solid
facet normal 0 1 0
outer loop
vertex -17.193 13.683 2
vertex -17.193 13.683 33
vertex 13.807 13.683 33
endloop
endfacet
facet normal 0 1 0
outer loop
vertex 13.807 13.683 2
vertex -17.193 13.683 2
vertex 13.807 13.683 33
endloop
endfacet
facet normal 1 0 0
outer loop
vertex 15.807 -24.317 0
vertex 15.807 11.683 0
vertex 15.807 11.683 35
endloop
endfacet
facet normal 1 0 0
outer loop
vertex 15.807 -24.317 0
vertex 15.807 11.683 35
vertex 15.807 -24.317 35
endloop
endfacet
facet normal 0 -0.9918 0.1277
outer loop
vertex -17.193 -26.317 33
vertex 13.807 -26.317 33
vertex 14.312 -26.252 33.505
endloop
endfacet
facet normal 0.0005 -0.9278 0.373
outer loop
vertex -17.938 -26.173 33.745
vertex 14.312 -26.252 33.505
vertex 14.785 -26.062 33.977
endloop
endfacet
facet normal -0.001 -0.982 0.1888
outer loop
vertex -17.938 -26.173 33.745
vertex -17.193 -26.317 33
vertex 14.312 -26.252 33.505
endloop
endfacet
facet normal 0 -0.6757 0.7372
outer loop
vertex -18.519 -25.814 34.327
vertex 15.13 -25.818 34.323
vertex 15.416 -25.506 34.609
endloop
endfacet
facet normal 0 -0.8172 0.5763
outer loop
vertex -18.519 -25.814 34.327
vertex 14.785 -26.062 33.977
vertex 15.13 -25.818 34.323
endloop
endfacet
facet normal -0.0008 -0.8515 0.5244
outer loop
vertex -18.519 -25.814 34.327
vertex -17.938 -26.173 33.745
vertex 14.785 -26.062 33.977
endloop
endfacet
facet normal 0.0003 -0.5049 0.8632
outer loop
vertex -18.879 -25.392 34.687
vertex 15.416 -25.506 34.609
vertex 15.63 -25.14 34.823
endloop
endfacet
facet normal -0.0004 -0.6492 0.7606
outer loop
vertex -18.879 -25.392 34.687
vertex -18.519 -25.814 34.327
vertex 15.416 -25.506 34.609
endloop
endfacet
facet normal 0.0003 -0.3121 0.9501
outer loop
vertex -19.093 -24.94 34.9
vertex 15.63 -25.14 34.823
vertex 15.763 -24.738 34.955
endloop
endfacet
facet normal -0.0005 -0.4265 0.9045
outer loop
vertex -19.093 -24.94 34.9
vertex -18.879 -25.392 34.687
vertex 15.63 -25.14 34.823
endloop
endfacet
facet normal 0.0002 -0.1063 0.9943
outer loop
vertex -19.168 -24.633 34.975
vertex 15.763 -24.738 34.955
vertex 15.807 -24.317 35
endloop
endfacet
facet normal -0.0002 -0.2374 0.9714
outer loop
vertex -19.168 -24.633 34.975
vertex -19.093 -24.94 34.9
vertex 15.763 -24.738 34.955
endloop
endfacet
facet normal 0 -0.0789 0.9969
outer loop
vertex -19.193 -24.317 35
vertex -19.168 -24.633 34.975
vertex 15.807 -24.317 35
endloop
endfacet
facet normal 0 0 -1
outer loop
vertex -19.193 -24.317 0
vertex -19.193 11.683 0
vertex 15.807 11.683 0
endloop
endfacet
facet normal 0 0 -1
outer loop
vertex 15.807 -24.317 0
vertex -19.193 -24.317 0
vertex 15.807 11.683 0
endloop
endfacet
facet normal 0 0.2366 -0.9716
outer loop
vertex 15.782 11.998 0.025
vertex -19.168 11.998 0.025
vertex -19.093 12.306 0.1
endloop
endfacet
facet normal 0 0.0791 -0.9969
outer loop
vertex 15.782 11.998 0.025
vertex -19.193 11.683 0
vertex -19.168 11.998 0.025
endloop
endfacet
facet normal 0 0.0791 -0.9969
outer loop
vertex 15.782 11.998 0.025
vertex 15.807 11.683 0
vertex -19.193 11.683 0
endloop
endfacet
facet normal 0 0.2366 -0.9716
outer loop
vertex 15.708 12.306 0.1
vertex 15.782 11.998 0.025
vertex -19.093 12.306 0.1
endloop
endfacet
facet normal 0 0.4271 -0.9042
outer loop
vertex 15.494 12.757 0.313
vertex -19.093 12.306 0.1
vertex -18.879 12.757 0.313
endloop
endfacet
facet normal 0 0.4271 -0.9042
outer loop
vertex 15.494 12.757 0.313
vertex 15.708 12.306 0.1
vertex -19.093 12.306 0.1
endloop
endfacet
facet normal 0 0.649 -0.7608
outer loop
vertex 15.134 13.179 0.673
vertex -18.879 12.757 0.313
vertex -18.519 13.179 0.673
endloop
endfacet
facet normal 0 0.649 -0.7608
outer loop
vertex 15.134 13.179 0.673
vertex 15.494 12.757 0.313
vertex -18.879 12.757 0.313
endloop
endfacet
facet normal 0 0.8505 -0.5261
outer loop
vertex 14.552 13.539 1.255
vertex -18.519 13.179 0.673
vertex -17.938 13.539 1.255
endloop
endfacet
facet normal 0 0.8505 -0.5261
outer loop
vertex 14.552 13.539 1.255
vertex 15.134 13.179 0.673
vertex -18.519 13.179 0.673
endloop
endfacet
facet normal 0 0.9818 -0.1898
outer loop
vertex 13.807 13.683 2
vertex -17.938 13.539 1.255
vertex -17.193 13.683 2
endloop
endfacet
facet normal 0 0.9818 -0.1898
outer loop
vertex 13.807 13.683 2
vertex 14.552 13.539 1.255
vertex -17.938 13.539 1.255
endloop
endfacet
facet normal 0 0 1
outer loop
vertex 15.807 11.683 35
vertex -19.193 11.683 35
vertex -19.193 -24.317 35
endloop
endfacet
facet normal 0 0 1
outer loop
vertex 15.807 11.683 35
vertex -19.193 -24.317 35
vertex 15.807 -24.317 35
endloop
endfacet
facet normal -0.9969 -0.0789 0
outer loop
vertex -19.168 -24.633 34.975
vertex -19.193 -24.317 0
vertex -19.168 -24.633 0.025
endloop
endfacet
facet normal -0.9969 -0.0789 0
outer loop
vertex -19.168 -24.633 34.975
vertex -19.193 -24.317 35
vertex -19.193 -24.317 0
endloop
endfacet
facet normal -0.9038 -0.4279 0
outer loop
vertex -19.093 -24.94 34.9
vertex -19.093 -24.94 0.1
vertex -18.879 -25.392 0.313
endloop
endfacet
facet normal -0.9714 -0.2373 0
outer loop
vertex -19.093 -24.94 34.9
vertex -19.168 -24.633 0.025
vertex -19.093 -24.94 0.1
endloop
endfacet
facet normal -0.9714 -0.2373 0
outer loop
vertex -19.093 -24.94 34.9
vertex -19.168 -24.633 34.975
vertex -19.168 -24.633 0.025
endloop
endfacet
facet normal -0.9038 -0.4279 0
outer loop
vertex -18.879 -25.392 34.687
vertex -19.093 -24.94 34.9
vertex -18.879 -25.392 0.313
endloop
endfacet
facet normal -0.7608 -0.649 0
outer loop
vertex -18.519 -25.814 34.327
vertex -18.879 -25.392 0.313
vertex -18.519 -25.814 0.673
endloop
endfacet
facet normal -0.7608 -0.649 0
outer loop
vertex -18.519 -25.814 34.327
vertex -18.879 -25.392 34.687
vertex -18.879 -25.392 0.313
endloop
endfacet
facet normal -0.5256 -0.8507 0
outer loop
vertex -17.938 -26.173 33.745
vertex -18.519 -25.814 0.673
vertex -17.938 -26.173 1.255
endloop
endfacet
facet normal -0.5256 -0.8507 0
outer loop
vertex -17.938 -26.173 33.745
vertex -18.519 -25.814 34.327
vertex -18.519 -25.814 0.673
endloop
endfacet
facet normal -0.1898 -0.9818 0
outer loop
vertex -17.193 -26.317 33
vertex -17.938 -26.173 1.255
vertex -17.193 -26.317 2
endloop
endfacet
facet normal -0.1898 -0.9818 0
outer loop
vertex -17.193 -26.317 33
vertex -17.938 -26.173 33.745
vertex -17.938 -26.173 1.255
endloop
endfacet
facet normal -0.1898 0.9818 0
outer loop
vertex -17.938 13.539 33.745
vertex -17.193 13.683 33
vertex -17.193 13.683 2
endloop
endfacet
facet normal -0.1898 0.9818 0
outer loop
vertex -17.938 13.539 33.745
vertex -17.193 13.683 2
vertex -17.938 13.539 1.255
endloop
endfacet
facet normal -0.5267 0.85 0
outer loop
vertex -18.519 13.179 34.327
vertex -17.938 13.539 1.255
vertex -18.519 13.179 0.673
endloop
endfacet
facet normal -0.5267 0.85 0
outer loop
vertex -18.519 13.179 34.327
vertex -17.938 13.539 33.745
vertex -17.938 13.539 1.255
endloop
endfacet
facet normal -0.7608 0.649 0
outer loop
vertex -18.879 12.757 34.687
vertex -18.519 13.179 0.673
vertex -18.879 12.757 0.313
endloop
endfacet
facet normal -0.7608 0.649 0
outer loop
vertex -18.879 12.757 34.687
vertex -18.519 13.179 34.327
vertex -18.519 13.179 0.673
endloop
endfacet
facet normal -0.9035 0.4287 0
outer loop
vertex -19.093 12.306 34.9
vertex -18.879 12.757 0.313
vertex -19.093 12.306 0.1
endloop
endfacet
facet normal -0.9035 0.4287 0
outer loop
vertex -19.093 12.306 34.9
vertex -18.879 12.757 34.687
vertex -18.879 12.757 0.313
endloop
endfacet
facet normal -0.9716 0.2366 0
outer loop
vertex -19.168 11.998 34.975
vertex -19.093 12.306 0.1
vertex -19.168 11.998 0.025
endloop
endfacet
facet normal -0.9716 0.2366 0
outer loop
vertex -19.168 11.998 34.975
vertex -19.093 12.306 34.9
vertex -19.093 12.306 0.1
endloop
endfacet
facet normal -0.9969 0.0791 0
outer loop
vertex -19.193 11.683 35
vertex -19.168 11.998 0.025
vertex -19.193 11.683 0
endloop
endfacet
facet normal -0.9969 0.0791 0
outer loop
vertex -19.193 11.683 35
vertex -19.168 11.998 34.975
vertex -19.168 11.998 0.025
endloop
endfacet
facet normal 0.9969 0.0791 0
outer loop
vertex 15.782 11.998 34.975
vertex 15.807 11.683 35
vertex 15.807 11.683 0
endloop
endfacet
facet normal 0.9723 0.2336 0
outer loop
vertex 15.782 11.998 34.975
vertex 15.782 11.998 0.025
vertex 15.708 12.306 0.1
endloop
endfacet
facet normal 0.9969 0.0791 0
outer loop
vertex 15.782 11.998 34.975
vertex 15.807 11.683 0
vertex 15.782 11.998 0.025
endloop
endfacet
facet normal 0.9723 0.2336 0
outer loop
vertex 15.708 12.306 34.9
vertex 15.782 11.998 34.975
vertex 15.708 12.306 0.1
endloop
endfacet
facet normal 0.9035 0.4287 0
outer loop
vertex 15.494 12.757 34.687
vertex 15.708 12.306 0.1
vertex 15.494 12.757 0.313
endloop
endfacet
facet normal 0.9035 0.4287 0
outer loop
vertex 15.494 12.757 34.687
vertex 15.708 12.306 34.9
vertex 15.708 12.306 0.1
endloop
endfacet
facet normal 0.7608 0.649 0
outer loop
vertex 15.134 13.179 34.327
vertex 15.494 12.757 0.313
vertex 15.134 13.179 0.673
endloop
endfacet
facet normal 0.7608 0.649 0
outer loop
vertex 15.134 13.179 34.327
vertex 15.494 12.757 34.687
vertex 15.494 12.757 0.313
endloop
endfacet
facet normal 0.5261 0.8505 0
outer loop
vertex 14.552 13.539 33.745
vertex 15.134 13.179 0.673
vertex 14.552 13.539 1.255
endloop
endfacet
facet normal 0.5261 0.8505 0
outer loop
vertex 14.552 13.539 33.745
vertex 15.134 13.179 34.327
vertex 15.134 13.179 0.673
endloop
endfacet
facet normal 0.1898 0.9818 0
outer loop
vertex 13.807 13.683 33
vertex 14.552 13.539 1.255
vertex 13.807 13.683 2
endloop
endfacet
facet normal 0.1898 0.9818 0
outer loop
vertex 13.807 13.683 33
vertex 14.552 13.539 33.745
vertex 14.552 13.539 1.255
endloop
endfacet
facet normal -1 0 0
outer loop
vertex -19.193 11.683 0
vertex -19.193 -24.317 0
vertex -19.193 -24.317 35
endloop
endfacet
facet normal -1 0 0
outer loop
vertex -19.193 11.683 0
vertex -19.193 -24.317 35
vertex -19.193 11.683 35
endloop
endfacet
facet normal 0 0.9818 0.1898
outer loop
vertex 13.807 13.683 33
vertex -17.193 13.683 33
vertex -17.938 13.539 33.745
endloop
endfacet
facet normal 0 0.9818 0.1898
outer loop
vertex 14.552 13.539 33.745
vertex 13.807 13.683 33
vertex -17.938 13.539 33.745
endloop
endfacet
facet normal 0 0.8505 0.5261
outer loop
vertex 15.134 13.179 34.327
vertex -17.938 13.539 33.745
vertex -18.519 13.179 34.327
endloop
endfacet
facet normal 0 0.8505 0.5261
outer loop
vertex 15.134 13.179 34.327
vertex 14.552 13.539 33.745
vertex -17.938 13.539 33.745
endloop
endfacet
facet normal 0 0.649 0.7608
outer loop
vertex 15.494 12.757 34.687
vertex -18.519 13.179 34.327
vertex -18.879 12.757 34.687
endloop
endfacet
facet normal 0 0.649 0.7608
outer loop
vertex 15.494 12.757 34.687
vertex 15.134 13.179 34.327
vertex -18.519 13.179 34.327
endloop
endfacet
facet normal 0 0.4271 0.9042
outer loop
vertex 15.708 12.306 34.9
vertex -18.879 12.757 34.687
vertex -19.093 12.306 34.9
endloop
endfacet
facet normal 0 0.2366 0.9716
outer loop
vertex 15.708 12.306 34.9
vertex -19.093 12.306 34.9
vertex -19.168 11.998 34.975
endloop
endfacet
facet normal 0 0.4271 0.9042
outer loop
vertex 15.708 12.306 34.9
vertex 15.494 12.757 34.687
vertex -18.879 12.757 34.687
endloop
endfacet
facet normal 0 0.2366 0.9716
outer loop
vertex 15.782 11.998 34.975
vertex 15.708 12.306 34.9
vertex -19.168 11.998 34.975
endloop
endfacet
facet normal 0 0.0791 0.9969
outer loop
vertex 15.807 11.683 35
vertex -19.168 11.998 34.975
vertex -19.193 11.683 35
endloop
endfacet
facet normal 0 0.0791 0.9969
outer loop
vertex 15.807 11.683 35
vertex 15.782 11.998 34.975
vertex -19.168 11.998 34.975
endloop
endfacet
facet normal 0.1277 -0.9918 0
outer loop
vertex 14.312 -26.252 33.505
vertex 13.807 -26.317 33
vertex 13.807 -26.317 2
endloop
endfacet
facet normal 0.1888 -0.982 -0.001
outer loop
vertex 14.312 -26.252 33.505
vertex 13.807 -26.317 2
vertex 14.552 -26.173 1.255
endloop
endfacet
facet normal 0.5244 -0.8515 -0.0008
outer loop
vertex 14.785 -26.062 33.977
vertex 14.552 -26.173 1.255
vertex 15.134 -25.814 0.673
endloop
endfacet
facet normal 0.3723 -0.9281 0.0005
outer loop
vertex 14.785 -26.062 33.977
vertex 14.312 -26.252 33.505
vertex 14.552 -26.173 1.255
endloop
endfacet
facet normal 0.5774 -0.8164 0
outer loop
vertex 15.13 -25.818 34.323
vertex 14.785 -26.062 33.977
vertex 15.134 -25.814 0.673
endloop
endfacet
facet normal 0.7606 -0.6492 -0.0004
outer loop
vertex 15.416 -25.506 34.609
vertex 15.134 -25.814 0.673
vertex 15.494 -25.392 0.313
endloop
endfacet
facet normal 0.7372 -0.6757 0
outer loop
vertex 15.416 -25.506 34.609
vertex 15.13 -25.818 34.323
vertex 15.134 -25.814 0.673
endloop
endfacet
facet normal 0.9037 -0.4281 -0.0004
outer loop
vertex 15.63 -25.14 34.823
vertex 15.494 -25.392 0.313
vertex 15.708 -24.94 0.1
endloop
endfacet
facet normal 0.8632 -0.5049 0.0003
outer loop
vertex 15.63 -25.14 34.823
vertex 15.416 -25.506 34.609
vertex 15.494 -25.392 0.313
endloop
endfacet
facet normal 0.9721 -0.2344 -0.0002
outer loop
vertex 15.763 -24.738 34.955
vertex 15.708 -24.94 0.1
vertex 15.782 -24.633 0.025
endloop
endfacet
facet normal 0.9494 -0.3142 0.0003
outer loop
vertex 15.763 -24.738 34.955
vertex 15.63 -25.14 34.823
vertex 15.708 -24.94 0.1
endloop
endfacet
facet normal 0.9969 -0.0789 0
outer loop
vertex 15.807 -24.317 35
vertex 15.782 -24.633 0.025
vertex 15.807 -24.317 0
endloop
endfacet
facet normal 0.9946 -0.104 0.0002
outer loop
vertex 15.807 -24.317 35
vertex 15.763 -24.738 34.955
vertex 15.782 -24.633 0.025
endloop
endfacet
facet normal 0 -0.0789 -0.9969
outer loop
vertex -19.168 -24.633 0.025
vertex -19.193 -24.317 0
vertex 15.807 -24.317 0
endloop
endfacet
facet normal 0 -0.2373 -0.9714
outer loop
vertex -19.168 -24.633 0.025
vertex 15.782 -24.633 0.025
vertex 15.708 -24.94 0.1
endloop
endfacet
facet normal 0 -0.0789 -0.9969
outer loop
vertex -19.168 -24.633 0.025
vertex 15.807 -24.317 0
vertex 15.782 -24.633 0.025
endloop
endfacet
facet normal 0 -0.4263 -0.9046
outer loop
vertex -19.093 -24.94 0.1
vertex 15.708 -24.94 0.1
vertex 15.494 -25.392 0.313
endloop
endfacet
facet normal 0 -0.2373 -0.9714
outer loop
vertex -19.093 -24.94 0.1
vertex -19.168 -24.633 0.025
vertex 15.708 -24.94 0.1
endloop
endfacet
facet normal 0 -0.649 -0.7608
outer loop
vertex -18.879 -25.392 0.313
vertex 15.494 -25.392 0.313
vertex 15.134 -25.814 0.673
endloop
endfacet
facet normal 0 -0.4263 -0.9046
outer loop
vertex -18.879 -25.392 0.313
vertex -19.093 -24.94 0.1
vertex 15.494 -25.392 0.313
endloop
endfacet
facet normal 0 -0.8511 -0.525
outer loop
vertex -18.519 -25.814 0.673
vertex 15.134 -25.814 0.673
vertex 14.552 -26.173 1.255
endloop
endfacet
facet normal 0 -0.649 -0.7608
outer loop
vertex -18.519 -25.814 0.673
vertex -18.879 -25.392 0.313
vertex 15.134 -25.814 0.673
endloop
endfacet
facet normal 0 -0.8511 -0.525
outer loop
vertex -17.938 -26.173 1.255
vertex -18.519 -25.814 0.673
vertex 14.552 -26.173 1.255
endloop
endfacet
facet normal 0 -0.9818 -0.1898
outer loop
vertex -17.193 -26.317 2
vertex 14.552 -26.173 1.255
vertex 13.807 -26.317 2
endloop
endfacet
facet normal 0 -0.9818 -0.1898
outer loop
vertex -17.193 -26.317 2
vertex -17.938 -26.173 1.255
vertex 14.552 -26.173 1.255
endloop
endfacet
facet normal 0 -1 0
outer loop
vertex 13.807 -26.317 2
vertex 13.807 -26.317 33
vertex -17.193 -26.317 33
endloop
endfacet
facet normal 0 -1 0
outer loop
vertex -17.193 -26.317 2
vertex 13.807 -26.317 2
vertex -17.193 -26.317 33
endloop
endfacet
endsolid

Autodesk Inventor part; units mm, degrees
ref_plane "YZ Plane" through (0, 0, 0) normal (1, 0, 0) x (0, 1, 0)
ref_plane "XZ Plane" through (0, 0, 0) normal (0, 1, 0) x (-1, 0, 0)
ref_plane "XY Plane" through (0, 0, 0) normal (0, 0, 1) x (1, 0, 0)
sketch "Skizze1" plane through (0, 0, 0) normal (0, 0, 1) x (1, 0, 0)
  line L0 (-19.1926, 13.6827) -> (15.8074, 13.6827)
  line L1 (15.8074, 13.6827) -> (15.8074, -26.3173)
  line L2 (15.8074, -26.3173) -> (-19.1926, -26.3173)
  line L3 (-19.1926, -26.3173) -> (-19.1926, 13.6827)
  point P0 (0, 0)
  dimension "d0" = 35
  dimension "d1" = 40
extrude "Extrusion1" add sketch "Skizze1" along normal blind 35
fillet "Rundung1" radius 2 8 edges at (-19.1926, 13.6827, 17.5) (15.8074, 13.6827, 17.5) (-1.6926, 13.6827, 35) (-1.6926, 13.6827, 0) (-1.6926, -26.3173, 0) (-19.1926, -26.3173, 17.5) (15.8074, -26.3173, 17.5) (-1.6926, -26.3173, 35)
sketch "Skizze2" plane through (0, 0, 35) normal (0, 0, 1) x (1, 0, 0)
  line L0 (-13.5333, 9.2381) -> (11.0513, 9.2381) construction
  line L1 (11.0513, 9.2381) -> (11.0513, -21.0985) construction
  line L2 (11.0513, -21.0985) -> (-13.5333, -21.0985) construction
  line L3 (-13.5333, -21.0985) -> (-13.5333, 9.2381) construction
  point P0 (0, 0)
properties part number "Lenkmotor"
